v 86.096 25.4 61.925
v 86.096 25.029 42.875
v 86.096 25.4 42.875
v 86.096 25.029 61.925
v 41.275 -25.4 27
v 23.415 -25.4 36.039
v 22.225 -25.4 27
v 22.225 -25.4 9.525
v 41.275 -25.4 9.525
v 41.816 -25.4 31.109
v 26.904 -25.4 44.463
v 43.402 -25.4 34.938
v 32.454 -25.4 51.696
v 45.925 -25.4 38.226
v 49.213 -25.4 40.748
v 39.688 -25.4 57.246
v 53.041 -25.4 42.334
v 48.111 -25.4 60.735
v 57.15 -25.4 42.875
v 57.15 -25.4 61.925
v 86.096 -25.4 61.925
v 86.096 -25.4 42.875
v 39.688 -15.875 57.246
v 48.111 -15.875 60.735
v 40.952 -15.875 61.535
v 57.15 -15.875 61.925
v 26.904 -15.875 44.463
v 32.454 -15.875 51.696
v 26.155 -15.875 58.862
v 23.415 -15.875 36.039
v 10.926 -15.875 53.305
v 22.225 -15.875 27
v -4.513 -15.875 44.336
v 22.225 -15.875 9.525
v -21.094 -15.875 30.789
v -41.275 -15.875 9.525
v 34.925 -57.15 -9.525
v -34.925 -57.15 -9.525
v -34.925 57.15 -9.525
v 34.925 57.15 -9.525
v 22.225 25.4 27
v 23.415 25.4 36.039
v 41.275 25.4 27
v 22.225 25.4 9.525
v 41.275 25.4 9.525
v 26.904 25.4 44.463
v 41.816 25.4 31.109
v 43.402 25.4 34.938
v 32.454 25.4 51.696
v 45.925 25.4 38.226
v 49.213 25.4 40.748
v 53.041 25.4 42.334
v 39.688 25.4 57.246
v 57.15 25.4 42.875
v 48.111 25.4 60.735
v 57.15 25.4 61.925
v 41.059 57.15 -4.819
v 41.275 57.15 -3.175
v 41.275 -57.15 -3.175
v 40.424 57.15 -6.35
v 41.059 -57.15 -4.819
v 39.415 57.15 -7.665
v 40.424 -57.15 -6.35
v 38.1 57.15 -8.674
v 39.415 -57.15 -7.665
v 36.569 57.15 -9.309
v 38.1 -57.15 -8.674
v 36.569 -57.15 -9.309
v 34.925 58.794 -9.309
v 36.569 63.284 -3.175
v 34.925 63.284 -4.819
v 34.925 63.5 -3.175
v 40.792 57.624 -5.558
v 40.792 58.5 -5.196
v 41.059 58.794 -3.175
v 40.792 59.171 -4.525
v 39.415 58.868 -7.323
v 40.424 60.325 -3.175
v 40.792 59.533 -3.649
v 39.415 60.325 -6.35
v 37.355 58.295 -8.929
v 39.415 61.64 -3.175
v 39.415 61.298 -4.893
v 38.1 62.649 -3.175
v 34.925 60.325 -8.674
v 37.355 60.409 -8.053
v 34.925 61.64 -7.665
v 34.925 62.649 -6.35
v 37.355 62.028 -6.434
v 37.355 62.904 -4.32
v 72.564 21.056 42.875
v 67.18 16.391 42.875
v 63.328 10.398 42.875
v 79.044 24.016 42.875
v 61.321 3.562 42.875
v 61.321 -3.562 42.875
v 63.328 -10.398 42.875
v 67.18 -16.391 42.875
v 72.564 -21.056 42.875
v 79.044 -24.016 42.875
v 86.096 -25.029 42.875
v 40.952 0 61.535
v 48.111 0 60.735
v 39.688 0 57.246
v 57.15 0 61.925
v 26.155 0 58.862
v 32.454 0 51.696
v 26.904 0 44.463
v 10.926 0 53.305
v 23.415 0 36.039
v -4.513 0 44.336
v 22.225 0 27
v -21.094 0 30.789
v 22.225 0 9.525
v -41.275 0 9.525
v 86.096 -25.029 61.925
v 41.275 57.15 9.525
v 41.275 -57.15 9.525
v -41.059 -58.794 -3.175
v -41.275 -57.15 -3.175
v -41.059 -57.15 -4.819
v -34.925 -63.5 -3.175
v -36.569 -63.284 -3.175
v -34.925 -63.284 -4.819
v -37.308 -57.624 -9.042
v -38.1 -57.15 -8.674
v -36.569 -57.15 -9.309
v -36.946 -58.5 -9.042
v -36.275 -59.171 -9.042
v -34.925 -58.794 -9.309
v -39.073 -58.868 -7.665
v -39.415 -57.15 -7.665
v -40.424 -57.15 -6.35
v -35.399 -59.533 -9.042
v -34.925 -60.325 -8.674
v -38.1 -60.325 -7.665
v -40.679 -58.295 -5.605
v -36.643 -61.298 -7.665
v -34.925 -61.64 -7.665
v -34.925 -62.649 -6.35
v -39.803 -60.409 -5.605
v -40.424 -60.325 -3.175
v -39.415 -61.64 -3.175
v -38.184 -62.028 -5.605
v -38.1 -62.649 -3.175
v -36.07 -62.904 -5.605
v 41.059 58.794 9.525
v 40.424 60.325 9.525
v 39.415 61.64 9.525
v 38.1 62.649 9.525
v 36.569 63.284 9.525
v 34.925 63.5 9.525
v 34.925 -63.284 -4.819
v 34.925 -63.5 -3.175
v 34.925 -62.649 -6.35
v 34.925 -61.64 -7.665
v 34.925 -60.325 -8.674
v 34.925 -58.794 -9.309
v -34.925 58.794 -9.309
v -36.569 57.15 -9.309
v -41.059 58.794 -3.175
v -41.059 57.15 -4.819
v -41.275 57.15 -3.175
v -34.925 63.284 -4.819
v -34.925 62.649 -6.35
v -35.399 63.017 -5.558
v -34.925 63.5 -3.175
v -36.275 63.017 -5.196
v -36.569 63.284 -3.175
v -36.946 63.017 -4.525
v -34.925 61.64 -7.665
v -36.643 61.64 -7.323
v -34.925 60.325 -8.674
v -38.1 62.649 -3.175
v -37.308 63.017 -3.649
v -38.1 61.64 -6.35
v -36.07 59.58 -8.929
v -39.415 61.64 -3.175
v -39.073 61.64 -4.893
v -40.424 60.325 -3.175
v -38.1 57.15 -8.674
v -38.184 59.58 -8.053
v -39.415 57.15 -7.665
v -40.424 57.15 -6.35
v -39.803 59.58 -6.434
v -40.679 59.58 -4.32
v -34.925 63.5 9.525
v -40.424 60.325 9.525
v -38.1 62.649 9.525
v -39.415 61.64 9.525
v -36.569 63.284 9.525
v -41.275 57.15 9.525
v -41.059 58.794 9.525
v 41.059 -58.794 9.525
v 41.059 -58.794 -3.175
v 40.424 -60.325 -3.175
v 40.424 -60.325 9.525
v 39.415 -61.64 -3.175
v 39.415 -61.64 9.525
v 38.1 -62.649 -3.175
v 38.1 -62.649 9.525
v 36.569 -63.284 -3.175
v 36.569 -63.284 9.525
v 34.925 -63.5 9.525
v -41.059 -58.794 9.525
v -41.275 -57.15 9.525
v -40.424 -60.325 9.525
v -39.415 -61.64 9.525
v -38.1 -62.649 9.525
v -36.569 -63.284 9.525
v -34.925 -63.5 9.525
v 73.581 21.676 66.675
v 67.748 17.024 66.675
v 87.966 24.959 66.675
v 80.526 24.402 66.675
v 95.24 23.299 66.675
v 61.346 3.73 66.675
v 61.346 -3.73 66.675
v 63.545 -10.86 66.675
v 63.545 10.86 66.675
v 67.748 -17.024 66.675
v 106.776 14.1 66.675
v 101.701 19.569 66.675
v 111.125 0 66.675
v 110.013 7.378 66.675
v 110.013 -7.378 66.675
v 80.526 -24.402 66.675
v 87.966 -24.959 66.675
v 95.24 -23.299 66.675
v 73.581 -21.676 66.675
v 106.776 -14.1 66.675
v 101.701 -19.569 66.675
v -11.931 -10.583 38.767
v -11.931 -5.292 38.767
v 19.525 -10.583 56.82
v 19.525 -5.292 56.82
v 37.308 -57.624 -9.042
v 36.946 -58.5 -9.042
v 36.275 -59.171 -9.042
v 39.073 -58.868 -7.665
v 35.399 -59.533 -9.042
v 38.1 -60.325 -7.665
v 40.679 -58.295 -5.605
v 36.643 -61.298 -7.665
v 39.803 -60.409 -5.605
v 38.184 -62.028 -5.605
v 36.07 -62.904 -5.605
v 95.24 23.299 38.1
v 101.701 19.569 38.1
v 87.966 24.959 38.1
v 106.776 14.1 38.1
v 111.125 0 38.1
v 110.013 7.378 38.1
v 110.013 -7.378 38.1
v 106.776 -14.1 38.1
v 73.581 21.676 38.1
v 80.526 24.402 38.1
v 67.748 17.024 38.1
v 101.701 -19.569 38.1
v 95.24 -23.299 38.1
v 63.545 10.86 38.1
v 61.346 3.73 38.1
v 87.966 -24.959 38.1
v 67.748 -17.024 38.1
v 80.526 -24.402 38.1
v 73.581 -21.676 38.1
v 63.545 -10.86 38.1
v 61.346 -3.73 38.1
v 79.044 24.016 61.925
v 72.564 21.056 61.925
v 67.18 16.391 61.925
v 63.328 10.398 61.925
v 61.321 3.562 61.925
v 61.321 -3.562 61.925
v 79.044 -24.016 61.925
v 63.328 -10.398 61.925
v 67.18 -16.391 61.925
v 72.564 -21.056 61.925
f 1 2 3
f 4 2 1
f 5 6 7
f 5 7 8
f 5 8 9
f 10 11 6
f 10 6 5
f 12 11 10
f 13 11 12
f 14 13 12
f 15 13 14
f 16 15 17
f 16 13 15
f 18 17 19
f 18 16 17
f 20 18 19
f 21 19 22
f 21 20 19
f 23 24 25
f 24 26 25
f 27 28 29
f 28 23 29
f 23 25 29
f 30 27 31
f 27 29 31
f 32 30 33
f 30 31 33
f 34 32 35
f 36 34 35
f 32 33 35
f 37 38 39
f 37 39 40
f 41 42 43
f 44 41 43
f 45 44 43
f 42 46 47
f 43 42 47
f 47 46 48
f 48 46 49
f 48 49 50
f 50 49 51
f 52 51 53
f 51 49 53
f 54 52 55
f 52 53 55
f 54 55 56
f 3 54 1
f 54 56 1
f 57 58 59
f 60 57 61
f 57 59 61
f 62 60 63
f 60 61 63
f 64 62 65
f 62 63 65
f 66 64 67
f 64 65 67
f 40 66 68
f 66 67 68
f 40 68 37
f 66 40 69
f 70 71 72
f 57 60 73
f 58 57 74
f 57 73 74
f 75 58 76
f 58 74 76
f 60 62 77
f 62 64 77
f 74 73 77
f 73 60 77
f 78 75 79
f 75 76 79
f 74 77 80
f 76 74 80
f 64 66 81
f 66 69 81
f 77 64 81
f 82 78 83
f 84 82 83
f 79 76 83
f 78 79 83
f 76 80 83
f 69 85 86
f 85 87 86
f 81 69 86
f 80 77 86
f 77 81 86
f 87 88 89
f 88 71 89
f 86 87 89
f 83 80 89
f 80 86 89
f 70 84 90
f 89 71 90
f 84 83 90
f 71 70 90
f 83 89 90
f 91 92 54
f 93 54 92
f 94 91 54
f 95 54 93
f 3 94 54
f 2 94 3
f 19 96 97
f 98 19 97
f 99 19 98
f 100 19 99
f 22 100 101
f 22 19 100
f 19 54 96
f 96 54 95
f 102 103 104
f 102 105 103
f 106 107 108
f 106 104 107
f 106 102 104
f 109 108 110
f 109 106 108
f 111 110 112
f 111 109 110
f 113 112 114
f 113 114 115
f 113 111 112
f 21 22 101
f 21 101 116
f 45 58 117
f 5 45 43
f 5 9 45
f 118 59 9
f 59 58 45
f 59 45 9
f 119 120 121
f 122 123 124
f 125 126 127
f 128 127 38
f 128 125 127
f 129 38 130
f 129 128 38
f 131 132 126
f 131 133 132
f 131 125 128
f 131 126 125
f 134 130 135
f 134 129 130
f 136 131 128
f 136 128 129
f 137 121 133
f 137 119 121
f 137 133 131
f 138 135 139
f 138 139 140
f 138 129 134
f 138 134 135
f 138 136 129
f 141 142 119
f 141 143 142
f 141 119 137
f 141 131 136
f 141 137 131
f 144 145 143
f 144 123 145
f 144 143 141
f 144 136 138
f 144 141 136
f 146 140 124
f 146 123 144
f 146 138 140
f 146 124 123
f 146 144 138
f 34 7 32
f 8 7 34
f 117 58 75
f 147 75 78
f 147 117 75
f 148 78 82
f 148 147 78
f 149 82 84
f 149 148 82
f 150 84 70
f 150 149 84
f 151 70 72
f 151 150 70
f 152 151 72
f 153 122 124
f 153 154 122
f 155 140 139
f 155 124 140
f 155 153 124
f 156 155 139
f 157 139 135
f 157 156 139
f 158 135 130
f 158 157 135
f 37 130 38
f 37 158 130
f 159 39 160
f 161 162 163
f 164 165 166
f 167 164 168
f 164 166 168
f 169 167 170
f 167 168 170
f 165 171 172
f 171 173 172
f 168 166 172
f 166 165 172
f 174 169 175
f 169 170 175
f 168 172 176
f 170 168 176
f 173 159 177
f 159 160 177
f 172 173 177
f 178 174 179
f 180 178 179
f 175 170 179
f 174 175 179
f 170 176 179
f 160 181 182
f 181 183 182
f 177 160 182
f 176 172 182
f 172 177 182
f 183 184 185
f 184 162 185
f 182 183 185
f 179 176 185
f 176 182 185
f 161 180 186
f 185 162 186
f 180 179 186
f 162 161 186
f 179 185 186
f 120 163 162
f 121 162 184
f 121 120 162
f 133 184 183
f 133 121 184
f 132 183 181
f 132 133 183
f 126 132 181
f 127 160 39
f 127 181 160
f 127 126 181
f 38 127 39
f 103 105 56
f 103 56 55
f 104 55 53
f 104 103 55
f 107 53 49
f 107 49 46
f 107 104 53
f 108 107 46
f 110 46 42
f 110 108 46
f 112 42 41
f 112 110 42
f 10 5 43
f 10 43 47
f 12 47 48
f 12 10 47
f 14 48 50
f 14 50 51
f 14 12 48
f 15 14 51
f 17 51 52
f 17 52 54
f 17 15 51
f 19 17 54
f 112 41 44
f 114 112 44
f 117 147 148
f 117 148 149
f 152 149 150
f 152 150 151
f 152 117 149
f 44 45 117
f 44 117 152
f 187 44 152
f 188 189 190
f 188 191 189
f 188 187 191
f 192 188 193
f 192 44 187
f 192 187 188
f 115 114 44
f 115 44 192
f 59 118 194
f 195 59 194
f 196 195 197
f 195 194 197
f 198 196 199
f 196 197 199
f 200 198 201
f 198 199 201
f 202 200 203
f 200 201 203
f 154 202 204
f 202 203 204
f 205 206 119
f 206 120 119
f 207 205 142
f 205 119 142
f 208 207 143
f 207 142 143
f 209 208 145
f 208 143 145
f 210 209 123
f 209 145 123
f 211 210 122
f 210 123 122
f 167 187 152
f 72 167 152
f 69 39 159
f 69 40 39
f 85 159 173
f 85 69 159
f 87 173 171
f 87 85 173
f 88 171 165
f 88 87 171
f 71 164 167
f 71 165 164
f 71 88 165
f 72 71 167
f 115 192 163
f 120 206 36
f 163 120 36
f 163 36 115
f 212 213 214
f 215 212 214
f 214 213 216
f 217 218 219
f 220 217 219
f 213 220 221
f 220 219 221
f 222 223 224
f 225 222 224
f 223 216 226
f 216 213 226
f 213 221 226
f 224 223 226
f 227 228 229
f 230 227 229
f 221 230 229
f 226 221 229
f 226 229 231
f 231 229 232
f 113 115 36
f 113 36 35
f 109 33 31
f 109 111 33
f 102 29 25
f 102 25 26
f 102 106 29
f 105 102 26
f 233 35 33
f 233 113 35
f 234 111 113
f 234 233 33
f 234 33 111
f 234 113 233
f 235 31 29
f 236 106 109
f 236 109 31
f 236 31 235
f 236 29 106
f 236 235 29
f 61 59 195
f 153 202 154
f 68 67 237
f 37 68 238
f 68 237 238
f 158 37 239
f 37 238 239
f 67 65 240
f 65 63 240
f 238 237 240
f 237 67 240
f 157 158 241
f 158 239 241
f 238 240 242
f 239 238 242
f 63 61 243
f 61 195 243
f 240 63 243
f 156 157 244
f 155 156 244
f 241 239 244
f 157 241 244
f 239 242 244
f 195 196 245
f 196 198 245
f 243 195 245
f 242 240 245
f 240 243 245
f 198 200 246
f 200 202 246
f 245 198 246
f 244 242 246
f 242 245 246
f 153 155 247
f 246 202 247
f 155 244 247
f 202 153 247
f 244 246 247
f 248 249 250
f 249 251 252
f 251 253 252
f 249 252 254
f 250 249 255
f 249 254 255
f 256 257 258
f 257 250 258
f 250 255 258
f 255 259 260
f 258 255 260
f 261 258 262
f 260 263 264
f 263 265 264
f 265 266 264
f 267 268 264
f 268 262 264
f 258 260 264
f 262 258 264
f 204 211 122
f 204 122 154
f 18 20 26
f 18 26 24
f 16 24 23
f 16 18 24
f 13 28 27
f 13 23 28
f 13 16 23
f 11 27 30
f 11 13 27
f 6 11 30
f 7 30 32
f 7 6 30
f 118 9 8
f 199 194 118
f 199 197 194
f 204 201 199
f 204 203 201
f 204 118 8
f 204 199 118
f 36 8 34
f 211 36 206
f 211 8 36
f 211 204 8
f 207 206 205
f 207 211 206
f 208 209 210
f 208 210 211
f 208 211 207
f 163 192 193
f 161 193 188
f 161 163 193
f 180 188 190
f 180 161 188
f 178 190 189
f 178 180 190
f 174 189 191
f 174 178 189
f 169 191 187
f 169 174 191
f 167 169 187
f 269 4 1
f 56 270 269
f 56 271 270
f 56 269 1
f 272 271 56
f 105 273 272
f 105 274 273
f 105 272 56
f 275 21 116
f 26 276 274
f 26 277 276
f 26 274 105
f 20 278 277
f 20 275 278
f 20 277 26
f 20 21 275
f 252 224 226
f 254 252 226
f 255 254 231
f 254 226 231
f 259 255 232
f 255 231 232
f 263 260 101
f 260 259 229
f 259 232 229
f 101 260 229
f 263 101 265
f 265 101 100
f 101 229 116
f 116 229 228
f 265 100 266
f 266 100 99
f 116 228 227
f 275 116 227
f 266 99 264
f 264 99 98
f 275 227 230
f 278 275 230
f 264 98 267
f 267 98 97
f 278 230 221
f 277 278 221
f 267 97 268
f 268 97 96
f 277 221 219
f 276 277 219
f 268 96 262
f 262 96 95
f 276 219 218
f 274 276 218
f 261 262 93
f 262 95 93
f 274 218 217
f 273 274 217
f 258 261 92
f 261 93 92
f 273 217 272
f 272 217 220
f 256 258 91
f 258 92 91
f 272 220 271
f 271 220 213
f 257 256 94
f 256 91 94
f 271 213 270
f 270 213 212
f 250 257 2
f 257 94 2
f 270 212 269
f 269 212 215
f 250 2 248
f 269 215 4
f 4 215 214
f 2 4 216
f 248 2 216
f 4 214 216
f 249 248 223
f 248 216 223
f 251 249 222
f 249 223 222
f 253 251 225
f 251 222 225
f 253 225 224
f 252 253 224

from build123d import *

# Parameters (mm, degrees)
F1_DEPTH = 63.5
F0_W     = 25.7705491662
F0_H     = 19.05
F2_DEPTH = 25.4
F3_DEPTH = 15.875
F4_DEPTH = 25.4
F6_R     = 6.35


with BuildPart() as f1:
    # F0 (on Front) → F1 (new body, symmetric)
    with BuildSketch(Plane.XZ):
        Polygon((22.225, 9.525), (-41.275, 9.525), (-41.275, -9.525), (41.275, -9.525), (41.275, 9.525), align=None)
    extrude(amount=F1_DEPTH, both=True)

    # F0 (on Front) → F2 (join, symmetric)
    with BuildSketch(Plane.XZ):
        with BuildLine():
            Line((22.225, 27.0002), (22.225, 9.525))
            Line((22.225, 9.525), (41.275, 9.525))
            Line((41.275, 9.525), (41.275, 27.0002))
            ThreePointArc((41.275, 27.0002), (45.9246798487, 38.2255201513), (57.15, 42.8752))
            Line((57.15, 42.8752), (60.325, 42.8752))
            Line((60.325, 42.8752), (60.325, 61.9252))
            Line((60.325, 61.9252), (57.15, 61.9252))
            ThreePointArc((57.15, 61.9252), (32.4542956671, 51.6959043329), (22.225, 27.0002))
        make_face()
        with Locations((73.2102745831, 52.4002)):
            Rectangle(F0_W, F0_H)
    extrude(amount=F2_DEPTH, both=True)

    # F0 (on Front) → F3 (join)
    with BuildSketch(Plane.XZ):
        with BuildLine():
            add(Edge.make_bspline(
                [(-41.275, 9.525), (-11.6340629756, 43.7753386796), (15.0888795033, 63.8811737299), (57.15, 61.9252)],
                knots=[0, 0, 0, 0, 111.5045361635, 111.5045361635, 111.5045361635, 111.5045361635], degree=3))
            Line((-41.275, 9.525), (22.225, 9.525))
            Line((22.225, 9.525), (22.225, 27.0002))
            ThreePointArc((22.225, 27.0002), (32.4542956671, 51.6959043329), (57.15, 61.9252))
        make_face()
    extrude(amount=F3_DEPTH)

    # F0 (on Front) → F4 (join, symmetric)
    with BuildSketch(Plane.XZ):
        with Locations((73.2102745831, 52.4002)):
            Rectangle(F0_W, F0_H)
    extrude(amount=F4_DEPTH, both=True)

    # F0 (on Front) → F5 (revolve)
    with BuildSketch(Plane.XZ):
        Polygon((86.0955491662, 66.675), (86.0955491662, 61.9252), (86.0955491662, 42.8752), (86.0955491662, 38.1), (111.125, 38.1), (111.125, 66.675), align=None)
    revolve(axis=Axis((86.0955491662, 0, 52.3875), (0, 0, -1)))

    # F6
    f6_edges = [f1.edges().sort_by_distance(p)[0] for p in [
        (41.275, -63.5, 0),
        (-41.275, -63.5, 0),
        (-41.275, 0, -9.525),
        (0, 63.5, -9.525),
        (41.275, 0, -9.525),
        (0, -63.5, -9.525),
        (-41.275, 63.5, 0),
        (41.275, 63.5, 0),
    ]]
    fillet(f6_edges, radius=F6_R)


solid = f1.part
